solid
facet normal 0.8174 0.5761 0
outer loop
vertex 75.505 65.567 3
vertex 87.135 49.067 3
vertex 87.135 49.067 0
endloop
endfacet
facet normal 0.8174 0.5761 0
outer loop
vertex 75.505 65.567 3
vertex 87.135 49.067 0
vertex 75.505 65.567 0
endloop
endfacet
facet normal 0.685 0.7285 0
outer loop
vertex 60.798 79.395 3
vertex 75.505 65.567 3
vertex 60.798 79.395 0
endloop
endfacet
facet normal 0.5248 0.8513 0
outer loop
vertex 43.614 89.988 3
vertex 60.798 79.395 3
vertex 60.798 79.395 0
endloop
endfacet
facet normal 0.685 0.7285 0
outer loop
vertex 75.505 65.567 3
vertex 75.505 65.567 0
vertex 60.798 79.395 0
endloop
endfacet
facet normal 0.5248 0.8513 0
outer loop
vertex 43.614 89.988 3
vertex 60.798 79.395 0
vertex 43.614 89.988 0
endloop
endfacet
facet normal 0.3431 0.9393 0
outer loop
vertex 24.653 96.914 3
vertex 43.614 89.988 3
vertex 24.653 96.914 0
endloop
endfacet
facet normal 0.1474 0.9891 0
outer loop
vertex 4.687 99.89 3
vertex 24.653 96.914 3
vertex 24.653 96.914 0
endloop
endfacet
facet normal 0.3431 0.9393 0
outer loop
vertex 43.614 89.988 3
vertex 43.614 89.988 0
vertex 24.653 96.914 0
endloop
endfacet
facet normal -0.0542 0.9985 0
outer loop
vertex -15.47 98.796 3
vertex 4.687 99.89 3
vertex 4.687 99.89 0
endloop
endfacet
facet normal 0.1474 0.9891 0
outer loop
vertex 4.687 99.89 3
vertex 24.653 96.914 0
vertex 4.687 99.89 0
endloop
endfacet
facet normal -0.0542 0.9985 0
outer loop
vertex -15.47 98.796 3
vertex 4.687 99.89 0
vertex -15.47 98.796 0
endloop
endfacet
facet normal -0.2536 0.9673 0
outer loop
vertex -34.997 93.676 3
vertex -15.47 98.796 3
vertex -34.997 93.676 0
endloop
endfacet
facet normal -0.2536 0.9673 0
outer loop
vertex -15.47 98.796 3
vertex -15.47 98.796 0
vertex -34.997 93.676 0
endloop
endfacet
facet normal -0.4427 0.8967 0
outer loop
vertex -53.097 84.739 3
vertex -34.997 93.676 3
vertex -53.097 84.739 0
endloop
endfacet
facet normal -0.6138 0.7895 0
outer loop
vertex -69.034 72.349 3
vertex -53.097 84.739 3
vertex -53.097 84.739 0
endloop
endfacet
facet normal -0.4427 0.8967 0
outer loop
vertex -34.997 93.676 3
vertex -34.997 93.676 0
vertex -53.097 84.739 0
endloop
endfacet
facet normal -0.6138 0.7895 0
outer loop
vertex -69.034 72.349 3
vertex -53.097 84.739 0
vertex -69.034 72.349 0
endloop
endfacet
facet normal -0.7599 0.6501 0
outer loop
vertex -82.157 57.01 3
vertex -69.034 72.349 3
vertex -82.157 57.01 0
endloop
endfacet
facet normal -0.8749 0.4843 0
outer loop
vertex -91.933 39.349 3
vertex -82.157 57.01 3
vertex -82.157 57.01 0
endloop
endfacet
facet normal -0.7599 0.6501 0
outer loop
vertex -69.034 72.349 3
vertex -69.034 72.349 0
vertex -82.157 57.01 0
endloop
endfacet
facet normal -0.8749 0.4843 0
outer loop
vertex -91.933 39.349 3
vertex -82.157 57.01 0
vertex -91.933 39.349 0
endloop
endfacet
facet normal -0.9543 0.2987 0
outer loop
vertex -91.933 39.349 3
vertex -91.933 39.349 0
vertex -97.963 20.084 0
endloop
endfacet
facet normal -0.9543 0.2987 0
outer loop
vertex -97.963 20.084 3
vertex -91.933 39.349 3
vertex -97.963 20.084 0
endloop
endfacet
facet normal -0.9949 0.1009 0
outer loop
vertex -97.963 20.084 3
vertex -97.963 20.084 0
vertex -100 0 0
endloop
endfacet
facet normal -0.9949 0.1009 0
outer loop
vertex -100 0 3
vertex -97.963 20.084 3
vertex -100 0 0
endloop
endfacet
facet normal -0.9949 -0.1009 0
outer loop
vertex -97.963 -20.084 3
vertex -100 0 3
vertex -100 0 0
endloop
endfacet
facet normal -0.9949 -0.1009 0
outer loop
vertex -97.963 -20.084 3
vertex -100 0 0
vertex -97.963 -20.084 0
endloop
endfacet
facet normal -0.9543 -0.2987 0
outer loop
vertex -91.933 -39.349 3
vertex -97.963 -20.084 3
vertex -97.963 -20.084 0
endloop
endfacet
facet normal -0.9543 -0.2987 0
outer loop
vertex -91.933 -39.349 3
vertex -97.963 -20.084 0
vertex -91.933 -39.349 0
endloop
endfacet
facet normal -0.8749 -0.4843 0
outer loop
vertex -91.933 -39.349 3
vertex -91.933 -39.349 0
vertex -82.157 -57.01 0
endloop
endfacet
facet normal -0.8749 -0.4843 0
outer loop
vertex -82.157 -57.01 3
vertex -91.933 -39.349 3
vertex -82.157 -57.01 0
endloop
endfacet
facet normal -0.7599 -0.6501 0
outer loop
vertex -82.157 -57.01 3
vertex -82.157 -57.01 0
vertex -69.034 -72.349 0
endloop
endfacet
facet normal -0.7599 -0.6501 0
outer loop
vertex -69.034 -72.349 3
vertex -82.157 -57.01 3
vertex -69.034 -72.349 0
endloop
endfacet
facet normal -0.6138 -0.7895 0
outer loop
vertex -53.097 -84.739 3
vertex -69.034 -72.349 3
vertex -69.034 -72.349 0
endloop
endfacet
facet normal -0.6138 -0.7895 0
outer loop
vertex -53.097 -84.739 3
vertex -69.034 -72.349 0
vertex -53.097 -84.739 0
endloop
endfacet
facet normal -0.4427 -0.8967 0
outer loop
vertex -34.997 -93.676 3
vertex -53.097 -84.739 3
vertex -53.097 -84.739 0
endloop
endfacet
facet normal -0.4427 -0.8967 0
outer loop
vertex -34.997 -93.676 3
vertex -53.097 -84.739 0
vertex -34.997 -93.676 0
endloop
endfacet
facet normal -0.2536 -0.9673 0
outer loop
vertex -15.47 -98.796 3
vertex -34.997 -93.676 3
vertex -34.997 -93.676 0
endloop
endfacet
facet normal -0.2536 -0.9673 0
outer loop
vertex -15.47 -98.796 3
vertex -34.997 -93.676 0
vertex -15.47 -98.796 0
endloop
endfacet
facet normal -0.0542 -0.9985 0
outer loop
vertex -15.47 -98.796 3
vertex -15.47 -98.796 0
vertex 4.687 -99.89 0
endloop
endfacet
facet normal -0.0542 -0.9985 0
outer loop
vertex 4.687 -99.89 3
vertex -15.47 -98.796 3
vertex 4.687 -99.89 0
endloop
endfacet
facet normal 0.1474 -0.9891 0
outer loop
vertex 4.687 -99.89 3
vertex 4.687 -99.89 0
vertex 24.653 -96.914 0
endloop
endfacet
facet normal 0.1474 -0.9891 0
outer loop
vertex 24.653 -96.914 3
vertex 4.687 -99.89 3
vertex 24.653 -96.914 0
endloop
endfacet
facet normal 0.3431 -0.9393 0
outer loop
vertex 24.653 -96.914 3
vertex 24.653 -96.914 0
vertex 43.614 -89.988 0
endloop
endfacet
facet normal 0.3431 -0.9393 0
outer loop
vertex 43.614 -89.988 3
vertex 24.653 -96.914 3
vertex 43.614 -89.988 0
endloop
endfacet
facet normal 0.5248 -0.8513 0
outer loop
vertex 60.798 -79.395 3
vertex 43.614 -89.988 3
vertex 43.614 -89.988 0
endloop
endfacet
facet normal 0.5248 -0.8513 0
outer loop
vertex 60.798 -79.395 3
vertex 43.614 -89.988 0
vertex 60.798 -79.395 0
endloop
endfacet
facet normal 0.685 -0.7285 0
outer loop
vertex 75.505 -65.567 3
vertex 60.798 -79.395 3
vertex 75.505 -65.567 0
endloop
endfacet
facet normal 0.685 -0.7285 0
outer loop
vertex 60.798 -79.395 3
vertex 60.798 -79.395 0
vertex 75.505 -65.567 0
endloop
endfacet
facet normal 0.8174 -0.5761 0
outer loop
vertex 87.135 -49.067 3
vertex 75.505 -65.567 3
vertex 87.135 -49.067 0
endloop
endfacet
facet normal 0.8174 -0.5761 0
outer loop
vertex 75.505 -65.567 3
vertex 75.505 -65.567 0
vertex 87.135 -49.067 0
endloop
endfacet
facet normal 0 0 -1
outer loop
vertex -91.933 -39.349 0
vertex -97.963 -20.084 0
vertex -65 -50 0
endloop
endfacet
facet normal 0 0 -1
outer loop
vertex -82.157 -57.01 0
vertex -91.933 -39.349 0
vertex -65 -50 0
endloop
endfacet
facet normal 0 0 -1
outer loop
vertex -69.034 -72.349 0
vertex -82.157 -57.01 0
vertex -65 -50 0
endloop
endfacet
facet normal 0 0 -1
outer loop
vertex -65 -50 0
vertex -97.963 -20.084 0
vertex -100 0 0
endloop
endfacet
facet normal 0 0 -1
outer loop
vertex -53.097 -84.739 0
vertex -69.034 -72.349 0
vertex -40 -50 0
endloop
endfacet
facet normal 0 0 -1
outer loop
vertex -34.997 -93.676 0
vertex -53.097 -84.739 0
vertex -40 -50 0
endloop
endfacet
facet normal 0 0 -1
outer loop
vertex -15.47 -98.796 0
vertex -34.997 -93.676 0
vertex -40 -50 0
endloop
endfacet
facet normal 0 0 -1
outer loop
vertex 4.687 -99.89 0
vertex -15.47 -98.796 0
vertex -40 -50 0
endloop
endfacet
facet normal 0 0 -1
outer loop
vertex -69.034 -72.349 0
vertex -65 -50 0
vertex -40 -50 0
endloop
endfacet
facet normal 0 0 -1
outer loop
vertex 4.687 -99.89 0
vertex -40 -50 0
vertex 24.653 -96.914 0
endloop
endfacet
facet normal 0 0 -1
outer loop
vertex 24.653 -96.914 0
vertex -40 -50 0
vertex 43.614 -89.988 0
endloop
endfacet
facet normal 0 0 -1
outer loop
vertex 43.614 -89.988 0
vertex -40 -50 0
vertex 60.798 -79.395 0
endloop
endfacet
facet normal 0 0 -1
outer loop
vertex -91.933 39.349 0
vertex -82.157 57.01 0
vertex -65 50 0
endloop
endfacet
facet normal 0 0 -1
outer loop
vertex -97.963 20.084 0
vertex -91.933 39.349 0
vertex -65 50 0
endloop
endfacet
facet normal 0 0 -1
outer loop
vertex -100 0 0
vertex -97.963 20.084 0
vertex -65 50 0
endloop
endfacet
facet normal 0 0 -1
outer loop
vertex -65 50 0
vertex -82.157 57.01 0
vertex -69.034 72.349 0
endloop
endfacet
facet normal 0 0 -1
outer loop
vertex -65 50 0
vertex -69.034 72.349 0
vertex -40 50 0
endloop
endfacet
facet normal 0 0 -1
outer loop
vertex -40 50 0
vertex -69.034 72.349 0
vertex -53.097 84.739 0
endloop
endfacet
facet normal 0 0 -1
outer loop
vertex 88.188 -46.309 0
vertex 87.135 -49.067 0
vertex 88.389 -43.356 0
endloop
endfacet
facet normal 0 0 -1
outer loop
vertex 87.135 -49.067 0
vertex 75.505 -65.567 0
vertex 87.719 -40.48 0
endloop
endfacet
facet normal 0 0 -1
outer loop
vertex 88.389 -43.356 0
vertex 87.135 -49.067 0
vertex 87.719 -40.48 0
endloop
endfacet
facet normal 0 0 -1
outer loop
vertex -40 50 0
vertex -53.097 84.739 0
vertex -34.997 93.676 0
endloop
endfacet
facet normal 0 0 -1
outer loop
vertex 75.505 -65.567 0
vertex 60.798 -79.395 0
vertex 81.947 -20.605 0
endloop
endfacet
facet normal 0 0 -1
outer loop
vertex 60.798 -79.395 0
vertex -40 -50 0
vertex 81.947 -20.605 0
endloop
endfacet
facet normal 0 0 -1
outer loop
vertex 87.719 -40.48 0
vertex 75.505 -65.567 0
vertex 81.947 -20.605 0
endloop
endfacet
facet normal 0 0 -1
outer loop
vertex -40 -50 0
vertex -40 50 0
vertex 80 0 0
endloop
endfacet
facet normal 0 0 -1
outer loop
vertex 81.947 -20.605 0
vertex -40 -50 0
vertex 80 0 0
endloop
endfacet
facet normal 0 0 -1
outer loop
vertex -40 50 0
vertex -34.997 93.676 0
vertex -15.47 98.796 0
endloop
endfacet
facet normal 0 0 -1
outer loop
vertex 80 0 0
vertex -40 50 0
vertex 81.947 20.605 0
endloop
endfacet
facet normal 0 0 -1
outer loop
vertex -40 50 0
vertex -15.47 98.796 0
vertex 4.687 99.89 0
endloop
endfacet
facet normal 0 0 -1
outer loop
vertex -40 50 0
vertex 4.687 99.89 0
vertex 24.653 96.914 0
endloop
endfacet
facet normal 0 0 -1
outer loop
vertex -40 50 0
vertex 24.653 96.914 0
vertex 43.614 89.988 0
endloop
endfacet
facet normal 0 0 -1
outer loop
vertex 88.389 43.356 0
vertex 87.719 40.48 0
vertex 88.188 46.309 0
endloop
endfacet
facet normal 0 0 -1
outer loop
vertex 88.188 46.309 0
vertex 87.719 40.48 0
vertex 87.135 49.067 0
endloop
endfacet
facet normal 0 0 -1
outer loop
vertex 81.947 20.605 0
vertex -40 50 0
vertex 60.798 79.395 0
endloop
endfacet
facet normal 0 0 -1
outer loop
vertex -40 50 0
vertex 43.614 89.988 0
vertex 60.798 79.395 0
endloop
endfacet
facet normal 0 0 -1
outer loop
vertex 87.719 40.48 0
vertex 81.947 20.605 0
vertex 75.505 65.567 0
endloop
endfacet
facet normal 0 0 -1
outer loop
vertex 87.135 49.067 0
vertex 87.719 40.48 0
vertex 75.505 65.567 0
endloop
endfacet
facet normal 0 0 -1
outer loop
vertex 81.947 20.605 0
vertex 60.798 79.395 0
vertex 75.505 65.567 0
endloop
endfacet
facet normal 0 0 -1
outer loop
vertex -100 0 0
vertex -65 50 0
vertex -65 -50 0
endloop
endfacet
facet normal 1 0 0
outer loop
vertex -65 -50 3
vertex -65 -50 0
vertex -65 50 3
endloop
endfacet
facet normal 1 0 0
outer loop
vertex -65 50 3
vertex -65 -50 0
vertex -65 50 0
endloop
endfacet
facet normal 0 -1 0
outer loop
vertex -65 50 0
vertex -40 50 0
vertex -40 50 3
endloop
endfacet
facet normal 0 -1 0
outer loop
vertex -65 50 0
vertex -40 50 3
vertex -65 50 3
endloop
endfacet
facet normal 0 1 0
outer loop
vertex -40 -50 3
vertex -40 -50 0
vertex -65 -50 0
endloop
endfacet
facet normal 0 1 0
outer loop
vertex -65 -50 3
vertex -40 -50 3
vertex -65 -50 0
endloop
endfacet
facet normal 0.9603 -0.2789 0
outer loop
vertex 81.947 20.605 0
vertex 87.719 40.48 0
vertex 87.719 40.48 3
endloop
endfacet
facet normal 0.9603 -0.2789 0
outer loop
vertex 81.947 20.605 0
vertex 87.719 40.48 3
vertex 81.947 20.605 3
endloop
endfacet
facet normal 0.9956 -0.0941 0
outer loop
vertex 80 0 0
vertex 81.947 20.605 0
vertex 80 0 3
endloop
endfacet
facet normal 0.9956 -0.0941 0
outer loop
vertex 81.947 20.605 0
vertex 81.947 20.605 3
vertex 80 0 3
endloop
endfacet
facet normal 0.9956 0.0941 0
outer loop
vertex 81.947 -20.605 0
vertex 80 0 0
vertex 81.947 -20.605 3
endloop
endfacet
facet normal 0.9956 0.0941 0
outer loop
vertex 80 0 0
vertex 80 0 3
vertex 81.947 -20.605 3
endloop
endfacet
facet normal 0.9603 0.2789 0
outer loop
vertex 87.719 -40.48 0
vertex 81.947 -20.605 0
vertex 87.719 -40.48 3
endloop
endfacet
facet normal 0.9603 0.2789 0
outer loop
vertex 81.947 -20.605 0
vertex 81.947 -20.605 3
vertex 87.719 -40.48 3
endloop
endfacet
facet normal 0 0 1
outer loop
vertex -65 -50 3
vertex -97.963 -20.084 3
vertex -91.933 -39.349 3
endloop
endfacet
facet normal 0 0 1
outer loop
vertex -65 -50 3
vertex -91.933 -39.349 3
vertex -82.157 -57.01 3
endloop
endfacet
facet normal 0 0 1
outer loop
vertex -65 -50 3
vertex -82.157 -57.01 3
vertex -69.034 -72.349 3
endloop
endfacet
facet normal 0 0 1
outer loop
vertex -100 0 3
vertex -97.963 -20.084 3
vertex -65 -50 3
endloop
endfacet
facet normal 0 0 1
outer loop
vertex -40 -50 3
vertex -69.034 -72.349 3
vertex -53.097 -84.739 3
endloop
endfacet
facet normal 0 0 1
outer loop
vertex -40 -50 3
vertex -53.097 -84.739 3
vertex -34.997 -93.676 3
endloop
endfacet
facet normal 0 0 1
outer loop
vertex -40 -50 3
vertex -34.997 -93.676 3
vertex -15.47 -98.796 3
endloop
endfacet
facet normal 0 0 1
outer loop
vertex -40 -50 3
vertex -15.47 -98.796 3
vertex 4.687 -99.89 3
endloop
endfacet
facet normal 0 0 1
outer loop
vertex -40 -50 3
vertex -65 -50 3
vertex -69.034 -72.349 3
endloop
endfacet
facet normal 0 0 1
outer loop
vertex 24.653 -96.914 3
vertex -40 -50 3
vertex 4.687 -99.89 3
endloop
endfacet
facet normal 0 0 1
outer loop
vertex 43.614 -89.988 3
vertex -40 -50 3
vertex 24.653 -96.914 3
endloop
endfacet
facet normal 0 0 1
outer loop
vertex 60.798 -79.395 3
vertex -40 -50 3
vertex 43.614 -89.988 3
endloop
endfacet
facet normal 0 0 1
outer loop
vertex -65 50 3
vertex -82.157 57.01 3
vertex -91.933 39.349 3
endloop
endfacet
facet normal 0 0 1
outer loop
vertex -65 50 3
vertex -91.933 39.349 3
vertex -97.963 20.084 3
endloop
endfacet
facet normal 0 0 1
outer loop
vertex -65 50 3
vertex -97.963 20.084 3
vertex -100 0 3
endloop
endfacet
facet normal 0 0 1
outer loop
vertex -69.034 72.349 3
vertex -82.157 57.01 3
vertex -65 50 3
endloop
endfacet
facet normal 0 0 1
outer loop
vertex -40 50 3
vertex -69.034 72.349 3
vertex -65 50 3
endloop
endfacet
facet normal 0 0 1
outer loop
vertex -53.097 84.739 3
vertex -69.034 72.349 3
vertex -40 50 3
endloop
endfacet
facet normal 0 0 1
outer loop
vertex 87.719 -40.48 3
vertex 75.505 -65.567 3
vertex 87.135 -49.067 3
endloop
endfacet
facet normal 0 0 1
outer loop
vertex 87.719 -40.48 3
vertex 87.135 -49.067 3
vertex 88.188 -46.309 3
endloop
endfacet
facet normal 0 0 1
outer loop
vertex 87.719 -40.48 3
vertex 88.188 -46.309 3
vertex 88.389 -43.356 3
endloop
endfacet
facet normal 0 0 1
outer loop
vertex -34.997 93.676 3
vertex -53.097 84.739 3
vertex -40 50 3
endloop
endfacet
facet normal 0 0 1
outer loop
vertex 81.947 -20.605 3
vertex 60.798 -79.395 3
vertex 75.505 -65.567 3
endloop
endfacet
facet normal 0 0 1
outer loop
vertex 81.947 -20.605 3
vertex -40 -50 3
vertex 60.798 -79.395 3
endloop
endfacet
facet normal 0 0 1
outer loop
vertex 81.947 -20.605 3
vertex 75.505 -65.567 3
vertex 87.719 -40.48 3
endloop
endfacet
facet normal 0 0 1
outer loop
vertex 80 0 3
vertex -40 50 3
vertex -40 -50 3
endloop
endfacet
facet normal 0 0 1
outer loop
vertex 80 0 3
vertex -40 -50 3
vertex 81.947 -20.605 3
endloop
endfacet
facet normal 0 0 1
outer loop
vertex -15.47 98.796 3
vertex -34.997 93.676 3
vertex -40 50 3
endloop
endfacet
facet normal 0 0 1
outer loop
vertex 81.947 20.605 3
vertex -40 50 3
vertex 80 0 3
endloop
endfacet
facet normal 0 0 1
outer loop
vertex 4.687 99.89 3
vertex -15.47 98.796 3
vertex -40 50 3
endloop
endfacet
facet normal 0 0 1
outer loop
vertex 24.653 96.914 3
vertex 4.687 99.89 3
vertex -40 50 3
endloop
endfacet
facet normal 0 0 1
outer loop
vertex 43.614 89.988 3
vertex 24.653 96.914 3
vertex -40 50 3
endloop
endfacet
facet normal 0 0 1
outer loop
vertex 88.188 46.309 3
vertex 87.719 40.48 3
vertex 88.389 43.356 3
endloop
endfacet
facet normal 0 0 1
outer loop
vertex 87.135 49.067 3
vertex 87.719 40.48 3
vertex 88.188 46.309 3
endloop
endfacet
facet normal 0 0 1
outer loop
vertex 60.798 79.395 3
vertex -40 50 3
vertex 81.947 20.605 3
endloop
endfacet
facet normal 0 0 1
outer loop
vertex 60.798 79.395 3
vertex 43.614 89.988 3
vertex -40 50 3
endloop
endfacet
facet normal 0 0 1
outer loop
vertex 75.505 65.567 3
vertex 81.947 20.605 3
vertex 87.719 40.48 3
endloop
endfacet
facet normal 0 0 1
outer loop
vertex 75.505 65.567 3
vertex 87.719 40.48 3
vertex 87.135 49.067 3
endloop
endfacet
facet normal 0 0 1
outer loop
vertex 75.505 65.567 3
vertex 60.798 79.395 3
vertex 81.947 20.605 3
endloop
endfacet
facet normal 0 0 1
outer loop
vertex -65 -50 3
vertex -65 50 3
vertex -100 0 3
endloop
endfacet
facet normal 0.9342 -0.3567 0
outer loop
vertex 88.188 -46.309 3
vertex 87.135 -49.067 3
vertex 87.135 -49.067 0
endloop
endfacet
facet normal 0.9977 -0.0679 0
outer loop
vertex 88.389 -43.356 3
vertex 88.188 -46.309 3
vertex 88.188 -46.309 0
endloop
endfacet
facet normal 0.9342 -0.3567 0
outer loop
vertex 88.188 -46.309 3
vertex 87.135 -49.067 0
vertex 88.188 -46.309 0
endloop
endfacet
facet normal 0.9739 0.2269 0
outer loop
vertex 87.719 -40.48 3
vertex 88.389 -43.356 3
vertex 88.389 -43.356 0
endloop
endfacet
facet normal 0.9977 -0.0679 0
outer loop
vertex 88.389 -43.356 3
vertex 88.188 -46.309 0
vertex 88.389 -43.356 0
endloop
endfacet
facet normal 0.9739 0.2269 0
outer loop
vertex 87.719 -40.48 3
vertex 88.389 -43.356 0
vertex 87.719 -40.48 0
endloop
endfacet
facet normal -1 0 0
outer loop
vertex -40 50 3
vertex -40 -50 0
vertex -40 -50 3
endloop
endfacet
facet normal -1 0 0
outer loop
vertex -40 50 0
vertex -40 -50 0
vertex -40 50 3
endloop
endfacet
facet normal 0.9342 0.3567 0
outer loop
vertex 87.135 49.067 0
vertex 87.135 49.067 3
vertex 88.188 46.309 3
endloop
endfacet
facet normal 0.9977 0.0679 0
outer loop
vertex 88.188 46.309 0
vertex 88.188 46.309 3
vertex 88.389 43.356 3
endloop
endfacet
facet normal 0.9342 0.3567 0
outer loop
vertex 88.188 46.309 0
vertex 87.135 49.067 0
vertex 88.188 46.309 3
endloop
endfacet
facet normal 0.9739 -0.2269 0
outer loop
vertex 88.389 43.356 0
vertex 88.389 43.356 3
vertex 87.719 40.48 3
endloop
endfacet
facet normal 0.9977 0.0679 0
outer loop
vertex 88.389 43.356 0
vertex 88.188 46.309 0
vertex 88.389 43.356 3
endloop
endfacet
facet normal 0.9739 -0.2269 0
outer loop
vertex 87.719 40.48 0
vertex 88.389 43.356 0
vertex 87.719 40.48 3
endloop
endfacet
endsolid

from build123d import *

# Parameters (mm, degrees)
CROQUIS1_R              = 100
SALIENTE_EXTRUIR1_DEPTH = 3
CROQUIS3_R              = 110
CORTAR_EXTRUIR1_DEPTH   = 3
REDONDEO1_R             = 10
CROQUIS4_W              = 25
CROQUIS4_H              = 100
CORTAR_EXTRUIR2_DEPTH   = 142.453172607


with BuildPart() as part:
    # Croquis1 → Saliente-Extruir1 (new body)
    with BuildSketch(Plane.XY):
        Circle(CROQUIS1_R)
    extrude(amount=SALIENTE_EXTRUIR1_DEPTH)

    # Croquis3 → Cortar-Extruir1 (cut)
    with BuildSketch(Plane.XY.offset(3)):
        with Locations((190, 0)):
            Circle(CROQUIS3_R)
    extrude(amount=-CORTAR_EXTRUIR1_DEPTH, mode=Mode.SUBTRACT)

    # Redondeo1
    redondeo1_edges = [part.edges().sort_by_distance(p)[0] for p in [
        (89.473684211, -44.659375654, 1.5),
        (89.473684211, 44.659375654, 1.5),
    ]]
    fillet(redondeo1_edges, radius=REDONDEO1_R)

    # Croquis4 → Cortar-Extruir2 (cut, through all)
    with BuildSketch(Plane(origin=(0, 0, 0), x_dir=(-1, 0, 0), z_dir=(0, 0, -1))):
        with Locations((52.5, 0)):
            Rectangle(CROQUIS4_W, CROQUIS4_H)
    extrude(amount=-CORTAR_EXTRUIR2_DEPTH, mode=Mode.SUBTRACT)


solid = part.part
